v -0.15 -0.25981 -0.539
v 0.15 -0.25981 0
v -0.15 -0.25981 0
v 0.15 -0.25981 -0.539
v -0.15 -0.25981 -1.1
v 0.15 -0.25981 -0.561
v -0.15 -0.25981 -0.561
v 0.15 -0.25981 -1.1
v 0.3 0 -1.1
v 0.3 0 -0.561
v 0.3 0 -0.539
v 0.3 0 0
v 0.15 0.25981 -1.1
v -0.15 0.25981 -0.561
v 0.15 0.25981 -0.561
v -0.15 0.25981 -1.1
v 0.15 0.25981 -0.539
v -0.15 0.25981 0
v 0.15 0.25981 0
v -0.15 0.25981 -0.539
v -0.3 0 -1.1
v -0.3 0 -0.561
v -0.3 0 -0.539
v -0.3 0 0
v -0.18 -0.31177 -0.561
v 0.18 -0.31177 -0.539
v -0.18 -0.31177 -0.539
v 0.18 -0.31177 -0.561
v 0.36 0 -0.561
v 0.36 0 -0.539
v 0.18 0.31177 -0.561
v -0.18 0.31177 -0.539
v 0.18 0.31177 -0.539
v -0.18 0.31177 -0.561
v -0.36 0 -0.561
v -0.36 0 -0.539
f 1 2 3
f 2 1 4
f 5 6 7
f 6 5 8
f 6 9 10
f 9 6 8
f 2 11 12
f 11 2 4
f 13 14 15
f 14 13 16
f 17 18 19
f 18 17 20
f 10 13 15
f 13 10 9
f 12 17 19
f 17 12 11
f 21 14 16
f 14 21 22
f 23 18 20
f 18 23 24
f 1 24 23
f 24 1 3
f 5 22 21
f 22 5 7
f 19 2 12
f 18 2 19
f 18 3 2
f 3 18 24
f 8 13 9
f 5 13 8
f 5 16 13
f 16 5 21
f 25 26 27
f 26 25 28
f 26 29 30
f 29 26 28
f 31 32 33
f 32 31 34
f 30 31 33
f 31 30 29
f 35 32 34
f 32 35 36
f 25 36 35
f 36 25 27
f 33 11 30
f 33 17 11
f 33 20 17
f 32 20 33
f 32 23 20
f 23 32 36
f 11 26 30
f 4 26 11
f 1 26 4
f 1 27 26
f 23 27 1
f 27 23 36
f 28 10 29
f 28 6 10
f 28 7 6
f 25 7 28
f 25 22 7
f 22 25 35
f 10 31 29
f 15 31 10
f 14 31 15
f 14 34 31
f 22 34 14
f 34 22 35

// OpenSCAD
R_side_grip = 0.015;
h_side_grip = 0.01;
R_hub = 0.3;
H_hub = 1.1;


translate([0, 0, -H_hub/2])
cylinder(h = H_hub, r1 = R_hub, r2 = R_hub, center = true, $fn=6);

translate([0, 0, -H_hub/2])
cylinder(h = 0.02*H_hub, r1 = 1.2*R_hub, r2 = 1.2*R_hub, center = true, $fn=6);
